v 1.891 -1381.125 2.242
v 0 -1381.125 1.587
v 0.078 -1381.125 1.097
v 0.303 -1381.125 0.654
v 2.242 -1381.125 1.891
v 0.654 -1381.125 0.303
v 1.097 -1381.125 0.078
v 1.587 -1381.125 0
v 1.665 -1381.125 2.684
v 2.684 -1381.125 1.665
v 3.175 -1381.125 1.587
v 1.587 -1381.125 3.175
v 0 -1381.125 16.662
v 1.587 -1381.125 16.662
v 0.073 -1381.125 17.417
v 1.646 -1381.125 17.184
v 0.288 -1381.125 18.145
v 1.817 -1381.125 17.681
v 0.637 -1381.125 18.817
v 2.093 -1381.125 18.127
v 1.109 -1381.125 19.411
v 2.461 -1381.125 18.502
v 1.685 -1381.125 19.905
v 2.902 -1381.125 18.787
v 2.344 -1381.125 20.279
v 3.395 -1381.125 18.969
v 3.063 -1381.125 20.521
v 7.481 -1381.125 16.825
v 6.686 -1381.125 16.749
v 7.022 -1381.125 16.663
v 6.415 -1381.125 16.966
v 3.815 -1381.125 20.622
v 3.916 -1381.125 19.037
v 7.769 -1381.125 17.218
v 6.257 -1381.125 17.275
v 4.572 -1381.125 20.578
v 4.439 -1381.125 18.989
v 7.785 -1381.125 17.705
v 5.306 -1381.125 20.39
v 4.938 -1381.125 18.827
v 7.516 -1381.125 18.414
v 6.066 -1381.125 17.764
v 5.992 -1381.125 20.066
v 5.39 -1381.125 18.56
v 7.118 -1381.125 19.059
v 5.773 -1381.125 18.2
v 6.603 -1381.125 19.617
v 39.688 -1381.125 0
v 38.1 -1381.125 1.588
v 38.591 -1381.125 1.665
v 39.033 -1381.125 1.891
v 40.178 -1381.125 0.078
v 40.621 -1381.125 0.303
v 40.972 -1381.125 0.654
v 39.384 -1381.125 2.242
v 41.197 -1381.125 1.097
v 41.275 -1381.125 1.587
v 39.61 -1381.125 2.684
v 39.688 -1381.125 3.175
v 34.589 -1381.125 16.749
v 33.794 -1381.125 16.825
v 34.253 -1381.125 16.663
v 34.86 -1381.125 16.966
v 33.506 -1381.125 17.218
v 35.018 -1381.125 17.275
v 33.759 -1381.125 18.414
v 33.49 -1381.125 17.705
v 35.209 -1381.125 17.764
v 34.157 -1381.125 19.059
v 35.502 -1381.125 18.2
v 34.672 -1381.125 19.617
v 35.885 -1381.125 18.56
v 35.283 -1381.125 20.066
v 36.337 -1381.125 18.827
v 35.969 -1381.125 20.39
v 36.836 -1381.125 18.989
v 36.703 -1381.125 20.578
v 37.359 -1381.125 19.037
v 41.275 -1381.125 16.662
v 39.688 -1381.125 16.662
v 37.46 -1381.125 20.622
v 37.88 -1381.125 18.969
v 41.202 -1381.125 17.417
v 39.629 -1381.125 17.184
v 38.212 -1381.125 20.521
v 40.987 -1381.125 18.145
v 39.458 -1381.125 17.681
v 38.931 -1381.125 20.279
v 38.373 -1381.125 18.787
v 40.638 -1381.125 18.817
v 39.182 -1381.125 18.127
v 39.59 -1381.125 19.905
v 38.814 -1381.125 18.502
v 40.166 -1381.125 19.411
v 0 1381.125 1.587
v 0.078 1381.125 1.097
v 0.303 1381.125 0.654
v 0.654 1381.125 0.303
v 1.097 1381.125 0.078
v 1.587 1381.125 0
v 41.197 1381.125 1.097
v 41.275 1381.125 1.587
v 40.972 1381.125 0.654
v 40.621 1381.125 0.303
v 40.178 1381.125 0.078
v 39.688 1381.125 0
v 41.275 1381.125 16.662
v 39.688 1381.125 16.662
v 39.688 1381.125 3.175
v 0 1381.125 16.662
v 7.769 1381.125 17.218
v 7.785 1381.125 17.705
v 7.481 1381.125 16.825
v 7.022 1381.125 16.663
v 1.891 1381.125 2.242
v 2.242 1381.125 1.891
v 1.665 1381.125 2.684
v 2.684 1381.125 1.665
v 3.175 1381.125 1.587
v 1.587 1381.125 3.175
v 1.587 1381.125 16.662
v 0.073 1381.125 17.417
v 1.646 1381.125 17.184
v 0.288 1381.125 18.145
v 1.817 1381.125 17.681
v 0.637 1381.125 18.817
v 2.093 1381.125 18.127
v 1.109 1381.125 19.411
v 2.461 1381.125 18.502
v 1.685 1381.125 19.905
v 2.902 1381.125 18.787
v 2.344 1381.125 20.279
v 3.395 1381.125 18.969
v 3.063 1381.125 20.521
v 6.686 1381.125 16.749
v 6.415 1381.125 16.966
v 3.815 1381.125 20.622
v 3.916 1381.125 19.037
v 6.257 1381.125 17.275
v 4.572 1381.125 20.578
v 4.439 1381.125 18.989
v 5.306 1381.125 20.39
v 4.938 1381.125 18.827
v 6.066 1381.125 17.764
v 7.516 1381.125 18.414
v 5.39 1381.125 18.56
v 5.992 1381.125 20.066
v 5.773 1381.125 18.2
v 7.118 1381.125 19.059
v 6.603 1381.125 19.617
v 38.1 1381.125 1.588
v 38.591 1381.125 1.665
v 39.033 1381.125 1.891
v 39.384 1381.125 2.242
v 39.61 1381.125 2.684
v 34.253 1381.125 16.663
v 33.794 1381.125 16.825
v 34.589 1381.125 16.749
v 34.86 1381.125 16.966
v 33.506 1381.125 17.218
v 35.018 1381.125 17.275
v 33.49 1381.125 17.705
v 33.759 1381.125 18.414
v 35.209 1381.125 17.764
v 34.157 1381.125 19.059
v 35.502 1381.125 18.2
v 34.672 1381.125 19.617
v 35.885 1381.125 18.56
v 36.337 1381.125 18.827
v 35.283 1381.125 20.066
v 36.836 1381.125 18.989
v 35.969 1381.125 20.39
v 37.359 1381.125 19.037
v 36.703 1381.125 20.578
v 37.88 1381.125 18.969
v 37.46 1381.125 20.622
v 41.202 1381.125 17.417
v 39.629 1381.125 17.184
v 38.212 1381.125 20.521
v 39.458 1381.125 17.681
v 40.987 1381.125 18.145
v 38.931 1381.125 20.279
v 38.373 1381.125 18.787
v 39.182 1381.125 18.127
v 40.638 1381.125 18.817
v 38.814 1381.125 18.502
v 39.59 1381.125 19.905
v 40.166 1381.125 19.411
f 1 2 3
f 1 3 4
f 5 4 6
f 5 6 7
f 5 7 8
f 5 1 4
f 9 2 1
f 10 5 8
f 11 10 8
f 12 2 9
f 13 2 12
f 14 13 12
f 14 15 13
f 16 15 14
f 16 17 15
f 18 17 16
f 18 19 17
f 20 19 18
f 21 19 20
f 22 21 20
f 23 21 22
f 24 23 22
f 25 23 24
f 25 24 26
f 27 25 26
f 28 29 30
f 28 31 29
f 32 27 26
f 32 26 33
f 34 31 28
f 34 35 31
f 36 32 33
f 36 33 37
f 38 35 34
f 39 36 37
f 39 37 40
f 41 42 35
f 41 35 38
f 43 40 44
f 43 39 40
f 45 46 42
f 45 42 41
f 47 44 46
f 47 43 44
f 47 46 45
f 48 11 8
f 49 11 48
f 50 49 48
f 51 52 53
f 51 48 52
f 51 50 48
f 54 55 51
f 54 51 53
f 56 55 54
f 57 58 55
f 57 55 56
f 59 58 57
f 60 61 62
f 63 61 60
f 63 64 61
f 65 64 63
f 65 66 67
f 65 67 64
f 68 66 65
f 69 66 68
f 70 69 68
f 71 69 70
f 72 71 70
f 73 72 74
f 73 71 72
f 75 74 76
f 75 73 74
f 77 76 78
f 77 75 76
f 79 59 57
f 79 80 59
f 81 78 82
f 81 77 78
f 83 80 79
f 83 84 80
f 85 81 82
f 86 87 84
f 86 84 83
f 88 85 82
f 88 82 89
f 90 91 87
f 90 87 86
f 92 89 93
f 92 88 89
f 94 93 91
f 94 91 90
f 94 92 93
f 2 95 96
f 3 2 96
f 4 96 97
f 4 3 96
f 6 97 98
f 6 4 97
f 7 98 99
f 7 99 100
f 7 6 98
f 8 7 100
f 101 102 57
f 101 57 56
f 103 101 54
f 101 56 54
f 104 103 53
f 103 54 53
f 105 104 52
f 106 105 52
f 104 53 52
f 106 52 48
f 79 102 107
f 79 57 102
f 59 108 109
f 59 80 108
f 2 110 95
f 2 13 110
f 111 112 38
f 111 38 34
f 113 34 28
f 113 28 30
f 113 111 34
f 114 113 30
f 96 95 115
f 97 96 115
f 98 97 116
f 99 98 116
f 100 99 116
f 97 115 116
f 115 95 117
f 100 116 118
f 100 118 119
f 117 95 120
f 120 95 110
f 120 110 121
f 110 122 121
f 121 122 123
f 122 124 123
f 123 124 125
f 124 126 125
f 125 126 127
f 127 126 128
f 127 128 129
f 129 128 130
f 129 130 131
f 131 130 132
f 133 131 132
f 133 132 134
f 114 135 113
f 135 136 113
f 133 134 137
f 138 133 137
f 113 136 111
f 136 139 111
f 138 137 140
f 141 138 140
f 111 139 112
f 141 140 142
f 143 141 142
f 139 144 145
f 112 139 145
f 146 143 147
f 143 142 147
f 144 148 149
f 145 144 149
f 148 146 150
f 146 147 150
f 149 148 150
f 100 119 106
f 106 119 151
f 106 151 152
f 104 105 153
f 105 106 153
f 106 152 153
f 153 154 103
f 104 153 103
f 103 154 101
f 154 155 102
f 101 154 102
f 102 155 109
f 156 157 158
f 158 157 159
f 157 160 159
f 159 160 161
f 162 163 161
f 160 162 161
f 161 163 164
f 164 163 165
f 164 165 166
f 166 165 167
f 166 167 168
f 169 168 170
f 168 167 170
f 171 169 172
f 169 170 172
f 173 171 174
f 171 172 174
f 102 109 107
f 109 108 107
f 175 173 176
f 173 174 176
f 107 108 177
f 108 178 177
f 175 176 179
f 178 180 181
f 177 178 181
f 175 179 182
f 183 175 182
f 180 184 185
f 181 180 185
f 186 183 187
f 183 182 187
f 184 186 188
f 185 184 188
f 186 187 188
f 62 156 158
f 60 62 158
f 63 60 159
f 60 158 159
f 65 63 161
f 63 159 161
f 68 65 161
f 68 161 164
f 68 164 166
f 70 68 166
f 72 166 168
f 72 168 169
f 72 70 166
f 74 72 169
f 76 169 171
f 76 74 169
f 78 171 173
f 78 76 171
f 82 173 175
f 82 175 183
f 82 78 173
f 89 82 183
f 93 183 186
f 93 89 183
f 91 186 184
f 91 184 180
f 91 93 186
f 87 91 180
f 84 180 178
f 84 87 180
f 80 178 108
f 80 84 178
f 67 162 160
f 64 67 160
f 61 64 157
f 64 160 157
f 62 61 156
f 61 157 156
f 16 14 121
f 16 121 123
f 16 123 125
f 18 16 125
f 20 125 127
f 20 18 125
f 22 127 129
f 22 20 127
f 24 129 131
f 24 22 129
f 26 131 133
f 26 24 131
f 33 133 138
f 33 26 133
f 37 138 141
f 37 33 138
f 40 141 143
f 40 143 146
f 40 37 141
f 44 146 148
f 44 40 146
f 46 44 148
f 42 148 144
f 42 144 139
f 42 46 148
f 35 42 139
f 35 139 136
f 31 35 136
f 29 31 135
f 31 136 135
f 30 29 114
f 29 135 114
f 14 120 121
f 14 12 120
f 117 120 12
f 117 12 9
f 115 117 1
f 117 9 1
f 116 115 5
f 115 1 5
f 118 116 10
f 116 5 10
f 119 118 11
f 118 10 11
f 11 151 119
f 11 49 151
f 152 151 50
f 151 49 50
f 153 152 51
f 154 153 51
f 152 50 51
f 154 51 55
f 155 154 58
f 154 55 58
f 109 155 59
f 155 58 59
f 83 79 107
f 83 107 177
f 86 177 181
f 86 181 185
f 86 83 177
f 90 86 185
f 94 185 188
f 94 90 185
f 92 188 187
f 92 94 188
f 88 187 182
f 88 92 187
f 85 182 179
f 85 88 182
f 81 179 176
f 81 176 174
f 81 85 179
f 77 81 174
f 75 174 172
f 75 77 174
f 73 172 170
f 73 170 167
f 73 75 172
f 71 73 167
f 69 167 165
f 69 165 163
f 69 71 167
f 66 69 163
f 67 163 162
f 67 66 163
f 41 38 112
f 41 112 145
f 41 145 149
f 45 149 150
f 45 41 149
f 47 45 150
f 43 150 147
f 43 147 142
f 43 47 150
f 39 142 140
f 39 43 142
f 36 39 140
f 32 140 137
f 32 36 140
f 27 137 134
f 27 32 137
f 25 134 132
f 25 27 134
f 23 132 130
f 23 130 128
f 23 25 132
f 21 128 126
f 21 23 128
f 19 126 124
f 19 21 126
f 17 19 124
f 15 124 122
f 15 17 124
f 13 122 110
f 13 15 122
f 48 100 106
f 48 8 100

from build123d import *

# Parameters (mm, degrees)
F1_DEPTH    = 1381.125
F2_R        = 1.5875
F3_T1_DEPTH = 2767.5102424874
F3_T3_DEPTH = 2765.8360222341


# Not quite as in the source:
# - a fillet or chamfer that OpenCascade refuses, or shapes differently, is made with other operations: its cross-section is extruded or revolved along the edge and cut away or added


with BuildPart() as f1:
    # F0 (on Front) → F1 (new body, symmetric)
    with BuildSketch(Plane.XZ):
        with BuildLine():
            Line((0, 16.6624), (0, 0))
            Line((0, 0), (41.275, 0))
            Line((41.275, 0), (41.275, 16.6624))
            ThreePointArc((41.275, 16.6624), (37.3126, 20.6248), (33.3502, 16.6624))
            Line((33.3502, 16.6624), (34.9377, 16.6624))
            ThreePointArc((34.9377, 16.6624), (37.3126, 19.0373), (39.6875, 16.6624))
            Line((39.6875, 16.6624), (39.6875, 1.5875))
            Line((39.6875, 1.5875), (1.5875, 1.5875))
            Line((1.5875, 1.5875), (1.5875, 16.6624))
            ThreePointArc((1.5875, 16.6624), (3.9624, 19.0373), (6.3373, 16.6624))
            Line((6.3373, 16.6624), (7.9248, 16.6624))
            ThreePointArc((7.9248, 16.6624), (3.9624, 20.6248), (0, 16.6624))
        make_face()
    extrude(amount=F1_DEPTH, both=True)

    # F2
    f2_edges = [f1.edges().sort_by_distance(p)[0] for p in [
        (41.275, 0, 0),
        (0, 0, 0),
        (39.6875, 0, 1.5875),
        (1.5875, 0, 1.5875),
    ]]
    fillet(f2_edges, radius=F2_R)

    # F3: fillet of radius 0.8255 on 4 edges, made by hand

    # F3_s2 → F3_t1 (cut)
    with BuildSketch(Plane.XZ.offset(-1383.7551212437)):
        with BuildLine():
            ThreePointArc((7.7851364071, 17.7051368421), (7.6447738654, 16.9868405041), (6.9887329889, 16.6624))
            Line((6.9887329889, 16.6624), (7.9248, 16.6624))
            ThreePointArc((7.9248, 16.6624), (7.889728895, 17.1884242487), (7.7851364071, 17.7051368421))
        make_face()
        with BuildLine():
            ThreePointArc((33.4898635929, 17.7051368421), (33.6302261346, 16.9868405041), (34.2862670111, 16.6624))
            Line((34.2862670111, 16.6624), (33.3502, 16.6624))
            ThreePointArc((33.3502, 16.6624), (33.385271105, 17.1884242487), (33.4898635929, 17.7051368421))
        make_face()
    extrude(amount=F3_T1_DEPTH, mode=Mode.SUBTRACT)

    # F3_s4 → F3_t3 (cut)
    with BuildSketch(Plane.XZ.offset(-1382.918011117)):
        with BuildLine():
            ThreePointArc((6.2569378236, 17.2749734127), (6.551672789, 16.8332164322), (7.0545044468, 16.6624))
            Line((7.0545044468, 16.6624), (6.3373, 16.6624))
            ThreePointArc((6.3373, 16.6624), (6.317123751, 16.9713110978), (6.2569378236, 17.2749734127))
        make_face()
        with BuildLine():
            ThreePointArc((34.2204955532, 16.6624), (34.723327211, 16.8332164322), (35.0180621764, 17.2749734127))
            ThreePointArc((35.0180621764, 17.2749734127), (34.957876249, 16.9713110978), (34.9377, 16.6624))
            Line((34.9377, 16.6624), (34.2204955532, 16.6624))
        make_face()
    extrude(amount=F3_T3_DEPTH, mode=Mode.SUBTRACT)


solid = f1.part
